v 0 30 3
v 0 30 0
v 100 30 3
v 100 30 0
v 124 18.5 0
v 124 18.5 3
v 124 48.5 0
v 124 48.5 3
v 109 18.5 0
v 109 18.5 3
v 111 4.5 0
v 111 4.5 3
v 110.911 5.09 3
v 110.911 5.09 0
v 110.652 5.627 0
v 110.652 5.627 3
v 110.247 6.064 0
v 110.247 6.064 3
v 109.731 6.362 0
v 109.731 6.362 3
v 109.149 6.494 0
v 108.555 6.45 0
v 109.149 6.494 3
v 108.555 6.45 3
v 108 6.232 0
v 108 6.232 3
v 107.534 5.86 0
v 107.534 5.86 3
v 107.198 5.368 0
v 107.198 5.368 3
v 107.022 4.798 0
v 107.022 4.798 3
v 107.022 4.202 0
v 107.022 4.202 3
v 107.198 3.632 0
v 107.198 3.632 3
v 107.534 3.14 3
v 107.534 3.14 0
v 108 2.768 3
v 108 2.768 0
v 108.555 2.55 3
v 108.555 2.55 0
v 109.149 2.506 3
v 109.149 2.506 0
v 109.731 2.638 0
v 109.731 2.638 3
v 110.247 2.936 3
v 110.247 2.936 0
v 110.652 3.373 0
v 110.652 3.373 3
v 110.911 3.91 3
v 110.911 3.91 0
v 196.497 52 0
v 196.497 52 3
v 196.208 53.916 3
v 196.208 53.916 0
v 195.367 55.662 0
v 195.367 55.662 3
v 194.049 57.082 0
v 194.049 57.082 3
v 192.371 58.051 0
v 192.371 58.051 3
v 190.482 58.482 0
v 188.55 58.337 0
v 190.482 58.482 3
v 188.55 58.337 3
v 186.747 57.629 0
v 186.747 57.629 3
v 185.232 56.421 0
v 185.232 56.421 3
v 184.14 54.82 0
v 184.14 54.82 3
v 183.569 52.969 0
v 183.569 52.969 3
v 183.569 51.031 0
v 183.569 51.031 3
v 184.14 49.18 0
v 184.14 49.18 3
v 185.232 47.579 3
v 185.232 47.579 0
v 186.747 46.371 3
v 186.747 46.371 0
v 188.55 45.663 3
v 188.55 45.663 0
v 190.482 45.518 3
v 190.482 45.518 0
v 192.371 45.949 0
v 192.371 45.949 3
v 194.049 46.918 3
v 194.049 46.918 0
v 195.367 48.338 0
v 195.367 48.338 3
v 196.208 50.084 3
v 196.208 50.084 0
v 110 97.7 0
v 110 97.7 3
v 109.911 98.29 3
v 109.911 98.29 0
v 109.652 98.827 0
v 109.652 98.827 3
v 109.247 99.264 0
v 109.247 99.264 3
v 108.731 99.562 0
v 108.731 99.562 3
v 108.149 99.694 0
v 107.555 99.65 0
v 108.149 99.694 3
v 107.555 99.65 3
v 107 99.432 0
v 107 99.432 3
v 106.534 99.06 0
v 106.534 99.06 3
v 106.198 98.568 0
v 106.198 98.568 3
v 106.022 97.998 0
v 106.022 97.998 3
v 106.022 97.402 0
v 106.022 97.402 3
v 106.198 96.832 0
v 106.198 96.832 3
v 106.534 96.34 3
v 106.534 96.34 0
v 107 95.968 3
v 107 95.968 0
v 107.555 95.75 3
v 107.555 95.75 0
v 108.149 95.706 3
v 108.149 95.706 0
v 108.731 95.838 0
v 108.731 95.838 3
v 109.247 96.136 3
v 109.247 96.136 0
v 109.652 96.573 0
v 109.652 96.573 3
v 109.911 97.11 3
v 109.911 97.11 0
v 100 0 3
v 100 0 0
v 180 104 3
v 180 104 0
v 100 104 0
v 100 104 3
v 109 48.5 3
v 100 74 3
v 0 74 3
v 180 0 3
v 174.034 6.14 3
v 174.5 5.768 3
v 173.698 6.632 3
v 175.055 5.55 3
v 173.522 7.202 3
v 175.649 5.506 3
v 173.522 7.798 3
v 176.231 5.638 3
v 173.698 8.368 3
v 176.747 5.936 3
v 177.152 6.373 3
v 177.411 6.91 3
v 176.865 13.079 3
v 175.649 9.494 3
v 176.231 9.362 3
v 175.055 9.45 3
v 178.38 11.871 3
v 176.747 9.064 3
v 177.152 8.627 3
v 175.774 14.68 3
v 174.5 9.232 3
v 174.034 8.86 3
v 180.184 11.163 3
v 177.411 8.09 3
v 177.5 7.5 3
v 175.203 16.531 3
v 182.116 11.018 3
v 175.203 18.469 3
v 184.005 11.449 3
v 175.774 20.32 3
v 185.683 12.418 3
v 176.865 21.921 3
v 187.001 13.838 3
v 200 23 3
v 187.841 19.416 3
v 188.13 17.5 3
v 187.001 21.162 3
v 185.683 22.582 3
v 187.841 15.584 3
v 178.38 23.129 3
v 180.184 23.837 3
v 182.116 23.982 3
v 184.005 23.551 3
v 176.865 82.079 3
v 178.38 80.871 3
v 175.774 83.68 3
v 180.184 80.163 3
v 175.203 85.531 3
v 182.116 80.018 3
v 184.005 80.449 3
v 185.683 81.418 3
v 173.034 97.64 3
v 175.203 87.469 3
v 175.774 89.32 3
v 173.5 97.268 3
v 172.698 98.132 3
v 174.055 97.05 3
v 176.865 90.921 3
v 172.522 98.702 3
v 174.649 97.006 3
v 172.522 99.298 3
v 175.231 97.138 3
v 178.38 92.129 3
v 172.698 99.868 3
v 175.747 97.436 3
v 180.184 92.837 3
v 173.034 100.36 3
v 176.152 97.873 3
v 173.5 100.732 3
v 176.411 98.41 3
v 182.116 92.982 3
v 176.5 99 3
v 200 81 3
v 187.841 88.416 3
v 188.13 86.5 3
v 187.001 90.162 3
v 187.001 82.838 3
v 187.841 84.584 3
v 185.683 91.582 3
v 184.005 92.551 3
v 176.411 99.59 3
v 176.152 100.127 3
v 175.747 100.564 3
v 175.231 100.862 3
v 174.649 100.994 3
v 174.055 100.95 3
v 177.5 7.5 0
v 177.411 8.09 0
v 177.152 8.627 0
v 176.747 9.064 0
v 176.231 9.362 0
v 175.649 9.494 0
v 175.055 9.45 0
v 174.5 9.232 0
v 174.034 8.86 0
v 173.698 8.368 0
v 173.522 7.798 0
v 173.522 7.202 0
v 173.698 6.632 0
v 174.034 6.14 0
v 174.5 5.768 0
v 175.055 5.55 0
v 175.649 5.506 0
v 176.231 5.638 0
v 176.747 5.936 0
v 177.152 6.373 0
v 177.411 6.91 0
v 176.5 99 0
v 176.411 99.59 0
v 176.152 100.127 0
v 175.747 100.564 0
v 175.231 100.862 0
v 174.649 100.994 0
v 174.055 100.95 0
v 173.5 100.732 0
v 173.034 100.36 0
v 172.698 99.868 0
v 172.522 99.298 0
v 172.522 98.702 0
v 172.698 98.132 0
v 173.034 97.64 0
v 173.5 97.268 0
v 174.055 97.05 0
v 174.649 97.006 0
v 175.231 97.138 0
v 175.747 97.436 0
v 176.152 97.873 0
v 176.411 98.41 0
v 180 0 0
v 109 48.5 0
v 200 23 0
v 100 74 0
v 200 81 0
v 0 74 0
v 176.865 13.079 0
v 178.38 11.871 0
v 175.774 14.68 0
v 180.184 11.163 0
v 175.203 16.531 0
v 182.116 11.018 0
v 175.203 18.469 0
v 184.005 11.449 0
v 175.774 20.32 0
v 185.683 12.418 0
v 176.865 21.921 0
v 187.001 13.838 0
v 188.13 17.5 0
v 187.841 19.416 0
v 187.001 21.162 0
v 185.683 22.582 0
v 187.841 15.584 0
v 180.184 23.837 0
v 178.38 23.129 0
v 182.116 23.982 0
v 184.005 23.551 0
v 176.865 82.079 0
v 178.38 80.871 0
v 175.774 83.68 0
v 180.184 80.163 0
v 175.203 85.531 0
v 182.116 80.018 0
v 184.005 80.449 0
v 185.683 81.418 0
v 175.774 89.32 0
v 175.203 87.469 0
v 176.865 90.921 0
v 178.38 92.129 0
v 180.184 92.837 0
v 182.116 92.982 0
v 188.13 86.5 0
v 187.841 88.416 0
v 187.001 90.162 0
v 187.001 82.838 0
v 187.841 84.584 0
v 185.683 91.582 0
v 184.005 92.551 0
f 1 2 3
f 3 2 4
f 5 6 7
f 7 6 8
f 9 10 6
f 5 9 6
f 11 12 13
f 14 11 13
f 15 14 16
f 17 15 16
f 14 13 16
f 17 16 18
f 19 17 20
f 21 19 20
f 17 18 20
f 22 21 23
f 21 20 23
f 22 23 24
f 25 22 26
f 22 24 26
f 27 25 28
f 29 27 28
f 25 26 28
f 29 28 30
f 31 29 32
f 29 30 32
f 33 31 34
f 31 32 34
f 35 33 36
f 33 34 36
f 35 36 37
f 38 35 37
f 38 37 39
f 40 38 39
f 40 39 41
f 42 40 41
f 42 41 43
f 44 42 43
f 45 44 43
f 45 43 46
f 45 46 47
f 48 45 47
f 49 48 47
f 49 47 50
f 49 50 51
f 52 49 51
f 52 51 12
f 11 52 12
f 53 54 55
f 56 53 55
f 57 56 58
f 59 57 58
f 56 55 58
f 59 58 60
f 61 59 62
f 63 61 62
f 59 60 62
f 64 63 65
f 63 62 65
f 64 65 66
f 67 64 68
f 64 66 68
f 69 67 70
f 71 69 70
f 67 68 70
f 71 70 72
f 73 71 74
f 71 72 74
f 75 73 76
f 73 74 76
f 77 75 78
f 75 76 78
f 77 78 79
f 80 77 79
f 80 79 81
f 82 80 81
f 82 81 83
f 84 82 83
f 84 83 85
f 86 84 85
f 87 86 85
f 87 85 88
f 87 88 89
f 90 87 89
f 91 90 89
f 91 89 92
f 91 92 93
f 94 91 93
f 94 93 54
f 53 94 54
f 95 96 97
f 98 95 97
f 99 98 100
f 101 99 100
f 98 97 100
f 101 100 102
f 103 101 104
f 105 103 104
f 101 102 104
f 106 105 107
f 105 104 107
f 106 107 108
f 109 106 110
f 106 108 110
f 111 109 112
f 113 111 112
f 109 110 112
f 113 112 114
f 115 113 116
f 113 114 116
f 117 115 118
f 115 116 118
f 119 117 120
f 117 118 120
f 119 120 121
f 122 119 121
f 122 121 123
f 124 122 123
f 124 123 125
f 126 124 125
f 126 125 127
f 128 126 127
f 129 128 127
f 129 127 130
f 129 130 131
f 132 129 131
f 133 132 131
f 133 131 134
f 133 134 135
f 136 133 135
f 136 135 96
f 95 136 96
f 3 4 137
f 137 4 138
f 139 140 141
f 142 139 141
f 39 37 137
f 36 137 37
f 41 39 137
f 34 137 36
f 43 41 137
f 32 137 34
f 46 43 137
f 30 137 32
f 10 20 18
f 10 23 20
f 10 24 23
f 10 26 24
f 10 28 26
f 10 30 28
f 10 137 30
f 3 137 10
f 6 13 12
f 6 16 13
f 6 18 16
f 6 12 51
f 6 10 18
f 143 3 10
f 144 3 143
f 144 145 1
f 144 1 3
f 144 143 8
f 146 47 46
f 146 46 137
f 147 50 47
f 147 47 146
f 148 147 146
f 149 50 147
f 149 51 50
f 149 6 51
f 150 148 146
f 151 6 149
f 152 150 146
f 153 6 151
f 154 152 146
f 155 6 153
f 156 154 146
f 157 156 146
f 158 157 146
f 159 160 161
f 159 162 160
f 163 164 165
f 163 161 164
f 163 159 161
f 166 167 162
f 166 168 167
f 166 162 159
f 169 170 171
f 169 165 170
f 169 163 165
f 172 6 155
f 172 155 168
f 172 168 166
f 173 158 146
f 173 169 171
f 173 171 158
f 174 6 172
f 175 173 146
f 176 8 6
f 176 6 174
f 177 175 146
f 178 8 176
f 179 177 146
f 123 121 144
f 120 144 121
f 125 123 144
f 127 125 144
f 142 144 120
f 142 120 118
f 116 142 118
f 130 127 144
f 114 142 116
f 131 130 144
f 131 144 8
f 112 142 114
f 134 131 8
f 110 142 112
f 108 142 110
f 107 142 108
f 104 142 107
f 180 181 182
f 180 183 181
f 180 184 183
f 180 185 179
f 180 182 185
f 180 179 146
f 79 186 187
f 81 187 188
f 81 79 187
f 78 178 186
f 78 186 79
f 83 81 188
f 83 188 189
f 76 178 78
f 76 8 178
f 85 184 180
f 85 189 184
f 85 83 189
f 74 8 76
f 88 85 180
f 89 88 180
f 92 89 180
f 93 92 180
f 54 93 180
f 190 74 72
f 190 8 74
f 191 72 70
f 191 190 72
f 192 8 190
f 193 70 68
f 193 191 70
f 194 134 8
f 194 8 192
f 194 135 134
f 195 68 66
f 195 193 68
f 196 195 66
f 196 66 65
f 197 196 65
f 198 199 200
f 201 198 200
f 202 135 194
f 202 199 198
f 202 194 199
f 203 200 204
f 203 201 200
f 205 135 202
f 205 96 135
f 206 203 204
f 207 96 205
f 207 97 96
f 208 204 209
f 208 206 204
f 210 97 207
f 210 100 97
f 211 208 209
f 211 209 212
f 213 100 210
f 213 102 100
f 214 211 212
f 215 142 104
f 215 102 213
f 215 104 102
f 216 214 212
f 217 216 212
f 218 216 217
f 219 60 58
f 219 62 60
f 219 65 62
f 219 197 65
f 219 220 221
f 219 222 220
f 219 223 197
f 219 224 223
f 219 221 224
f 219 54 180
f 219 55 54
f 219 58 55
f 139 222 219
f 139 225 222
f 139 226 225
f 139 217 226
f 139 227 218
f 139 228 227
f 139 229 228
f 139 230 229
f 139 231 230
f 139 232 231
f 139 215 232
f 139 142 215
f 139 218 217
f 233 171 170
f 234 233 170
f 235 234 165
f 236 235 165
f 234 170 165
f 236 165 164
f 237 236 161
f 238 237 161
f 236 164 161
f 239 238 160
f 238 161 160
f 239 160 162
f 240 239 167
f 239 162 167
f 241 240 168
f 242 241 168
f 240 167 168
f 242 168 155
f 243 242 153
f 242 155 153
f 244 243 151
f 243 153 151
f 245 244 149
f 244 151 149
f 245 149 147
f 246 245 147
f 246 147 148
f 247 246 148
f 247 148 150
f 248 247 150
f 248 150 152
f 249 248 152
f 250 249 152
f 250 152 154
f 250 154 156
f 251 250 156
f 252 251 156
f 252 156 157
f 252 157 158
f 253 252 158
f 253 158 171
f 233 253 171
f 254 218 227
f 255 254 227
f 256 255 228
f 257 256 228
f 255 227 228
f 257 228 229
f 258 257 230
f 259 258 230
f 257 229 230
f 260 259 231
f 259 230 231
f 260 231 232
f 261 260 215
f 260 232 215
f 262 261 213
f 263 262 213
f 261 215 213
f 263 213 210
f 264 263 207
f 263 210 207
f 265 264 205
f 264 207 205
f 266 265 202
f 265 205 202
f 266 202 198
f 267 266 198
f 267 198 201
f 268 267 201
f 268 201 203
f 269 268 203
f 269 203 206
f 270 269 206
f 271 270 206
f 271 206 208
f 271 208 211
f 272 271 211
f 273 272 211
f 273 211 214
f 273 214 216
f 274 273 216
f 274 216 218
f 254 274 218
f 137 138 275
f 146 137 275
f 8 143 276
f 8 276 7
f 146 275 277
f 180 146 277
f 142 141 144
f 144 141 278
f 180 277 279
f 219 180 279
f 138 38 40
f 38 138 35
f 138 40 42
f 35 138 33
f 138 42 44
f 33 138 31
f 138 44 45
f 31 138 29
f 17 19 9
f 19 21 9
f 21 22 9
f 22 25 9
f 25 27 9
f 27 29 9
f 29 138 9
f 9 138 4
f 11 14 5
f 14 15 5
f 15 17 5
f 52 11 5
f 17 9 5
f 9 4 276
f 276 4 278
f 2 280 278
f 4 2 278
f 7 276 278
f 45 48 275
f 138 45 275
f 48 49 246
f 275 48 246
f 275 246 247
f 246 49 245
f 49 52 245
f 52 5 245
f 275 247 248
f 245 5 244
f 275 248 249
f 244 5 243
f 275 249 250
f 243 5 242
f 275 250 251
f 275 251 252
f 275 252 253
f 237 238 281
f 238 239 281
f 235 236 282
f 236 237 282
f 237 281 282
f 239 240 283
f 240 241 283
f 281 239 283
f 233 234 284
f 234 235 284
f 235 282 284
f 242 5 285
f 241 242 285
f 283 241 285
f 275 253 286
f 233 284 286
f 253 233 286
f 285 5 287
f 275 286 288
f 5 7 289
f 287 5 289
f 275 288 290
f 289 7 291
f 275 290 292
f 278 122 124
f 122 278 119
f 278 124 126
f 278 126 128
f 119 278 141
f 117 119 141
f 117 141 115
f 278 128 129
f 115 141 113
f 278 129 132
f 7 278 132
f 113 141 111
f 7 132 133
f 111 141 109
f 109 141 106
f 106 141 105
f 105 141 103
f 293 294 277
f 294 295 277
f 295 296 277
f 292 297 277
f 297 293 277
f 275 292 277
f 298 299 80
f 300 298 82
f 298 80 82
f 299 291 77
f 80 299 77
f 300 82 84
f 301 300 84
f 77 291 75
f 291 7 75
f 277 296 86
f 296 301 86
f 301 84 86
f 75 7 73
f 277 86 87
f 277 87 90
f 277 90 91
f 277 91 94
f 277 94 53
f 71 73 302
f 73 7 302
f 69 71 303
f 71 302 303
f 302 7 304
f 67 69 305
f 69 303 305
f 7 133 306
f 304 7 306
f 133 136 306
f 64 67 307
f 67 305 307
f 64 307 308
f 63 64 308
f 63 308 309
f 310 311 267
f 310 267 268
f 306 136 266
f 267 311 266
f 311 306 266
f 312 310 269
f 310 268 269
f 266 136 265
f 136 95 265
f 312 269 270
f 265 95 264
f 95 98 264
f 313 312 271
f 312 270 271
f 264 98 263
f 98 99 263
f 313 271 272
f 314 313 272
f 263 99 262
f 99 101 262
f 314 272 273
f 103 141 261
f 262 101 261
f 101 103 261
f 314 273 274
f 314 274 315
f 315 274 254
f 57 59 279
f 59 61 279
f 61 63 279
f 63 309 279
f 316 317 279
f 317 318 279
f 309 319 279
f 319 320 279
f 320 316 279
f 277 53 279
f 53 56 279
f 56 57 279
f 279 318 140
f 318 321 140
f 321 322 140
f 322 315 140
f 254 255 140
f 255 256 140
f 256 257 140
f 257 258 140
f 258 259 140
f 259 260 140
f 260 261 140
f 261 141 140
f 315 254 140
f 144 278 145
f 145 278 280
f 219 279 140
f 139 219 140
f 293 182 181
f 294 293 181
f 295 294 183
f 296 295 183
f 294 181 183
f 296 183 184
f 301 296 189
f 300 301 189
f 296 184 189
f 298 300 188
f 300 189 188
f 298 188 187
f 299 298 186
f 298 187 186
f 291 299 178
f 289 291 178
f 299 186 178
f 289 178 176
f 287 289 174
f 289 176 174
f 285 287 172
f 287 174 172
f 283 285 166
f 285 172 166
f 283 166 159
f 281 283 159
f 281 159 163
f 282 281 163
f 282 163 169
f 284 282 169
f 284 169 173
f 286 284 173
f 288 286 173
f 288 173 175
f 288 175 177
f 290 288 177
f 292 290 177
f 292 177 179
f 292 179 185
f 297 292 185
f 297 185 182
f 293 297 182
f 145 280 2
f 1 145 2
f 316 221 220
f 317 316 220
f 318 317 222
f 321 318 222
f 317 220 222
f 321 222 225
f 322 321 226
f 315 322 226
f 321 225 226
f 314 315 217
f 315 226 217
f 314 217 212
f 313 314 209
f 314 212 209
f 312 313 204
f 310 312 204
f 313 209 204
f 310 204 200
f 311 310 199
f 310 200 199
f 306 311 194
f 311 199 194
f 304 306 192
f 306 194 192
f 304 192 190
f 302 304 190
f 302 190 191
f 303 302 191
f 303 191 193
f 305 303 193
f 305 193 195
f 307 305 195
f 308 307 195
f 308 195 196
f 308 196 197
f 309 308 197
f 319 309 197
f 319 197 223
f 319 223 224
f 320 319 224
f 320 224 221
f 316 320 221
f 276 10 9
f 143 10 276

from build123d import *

# Parameters (mm, degrees)
RESSALTO_EXTRUS_O1_DEPTH = 3
ESBO_O2_W                = 15
ESBO_O2_H                = 30
CORTE_EXTRUS_O1_DEPTH    = 10
ESBO_O3_R                = 2
CORTE_EXTRUS_O2_DEPTH    = 10
ESBO_O4_R                = 2
CORTE_EXTRUS_O3_DEPTH    = 10
ESBO_O5_R                = 2
CORTE_EXTRUS_O4_DEPTH    = 10
ESBO_O6_R                = 2
CORTE_EXTRUS_O5_DEPTH    = 10
ESBO_O7_R                = 6.5
CORTE_EXTRUS_O6_DEPTH    = 10
ESBO_O8_R                = 6.5
CORTE_EXTRUS_O7_DEPTH    = 10


with BuildPart() as part:
    # Esboço1 → Ressalto-extrusão1 (new body)
    with BuildSketch(Plane.XY):
        Polygon((100, 0), (180, 0), (200, 23), (200, 81), (180, 104), (100, 104), (100, 74), (0, 74), (0, 30), (100, 30), align=None)
    extrude(amount=RESSALTO_EXTRUS_O1_DEPTH)

    # Esboço2 → Corte-extrusão1 (cut)
    with BuildSketch(Plane.XY.offset(3)):
        with Locations((116.5, 33.5)):
            Rectangle(ESBO_O2_W, ESBO_O2_H)
    extrude(amount=-CORTE_EXTRUS_O1_DEPTH, mode=Mode.SUBTRACT)

    # Esboço3 → Corte-extrusão2 (cut)
    with BuildSketch(Plane.XY.offset(3)):
        with Locations((109, 4.5)):
            Circle(ESBO_O3_R)
    extrude(amount=-CORTE_EXTRUS_O2_DEPTH, mode=Mode.SUBTRACT)

    # Esboço4 → Corte-extrusão3 (cut)
    with BuildSketch(Plane.XY.offset(3)):
        with Locations((175.5, 7.5)):
            Circle(ESBO_O4_R)
    extrude(amount=-CORTE_EXTRUS_O3_DEPTH, mode=Mode.SUBTRACT)

    # Esboço5 → Corte-extrusão4 (cut)
    with BuildSketch(Plane.XY.offset(3)):
        with Locations((108, 97.7)):
            Circle(ESBO_O5_R)
    extrude(amount=-CORTE_EXTRUS_O4_DEPTH, mode=Mode.SUBTRACT)

    # Esboço6 → Corte-extrusão5 (cut)
    with BuildSketch(Plane.XY.offset(3)):
        with Locations((174.5, 99)):
            Circle(ESBO_O6_R)
    extrude(amount=-CORTE_EXTRUS_O5_DEPTH, mode=Mode.SUBTRACT)

    # Esboço7 → Corte-extrusão6 (cut)
    with BuildSketch(Plane.XY.offset(3)):
        with Locations((181.63, 86.5)):
            Circle(ESBO_O7_R)
        with Locations((181.63, 17.5)):
            Circle(ESBO_O7_R)
    extrude(amount=-CORTE_EXTRUS_O6_DEPTH, mode=Mode.SUBTRACT)

    # Esboço8 → Corte-extrusão7 (cut)
    with BuildSketch(Plane.XY.offset(3)):
        with Locations((189.996600265, 52)):
            Circle(ESBO_O8_R)
    extrude(amount=-CORTE_EXTRUS_O7_DEPTH, mode=Mode.SUBTRACT)


solid = part.part
